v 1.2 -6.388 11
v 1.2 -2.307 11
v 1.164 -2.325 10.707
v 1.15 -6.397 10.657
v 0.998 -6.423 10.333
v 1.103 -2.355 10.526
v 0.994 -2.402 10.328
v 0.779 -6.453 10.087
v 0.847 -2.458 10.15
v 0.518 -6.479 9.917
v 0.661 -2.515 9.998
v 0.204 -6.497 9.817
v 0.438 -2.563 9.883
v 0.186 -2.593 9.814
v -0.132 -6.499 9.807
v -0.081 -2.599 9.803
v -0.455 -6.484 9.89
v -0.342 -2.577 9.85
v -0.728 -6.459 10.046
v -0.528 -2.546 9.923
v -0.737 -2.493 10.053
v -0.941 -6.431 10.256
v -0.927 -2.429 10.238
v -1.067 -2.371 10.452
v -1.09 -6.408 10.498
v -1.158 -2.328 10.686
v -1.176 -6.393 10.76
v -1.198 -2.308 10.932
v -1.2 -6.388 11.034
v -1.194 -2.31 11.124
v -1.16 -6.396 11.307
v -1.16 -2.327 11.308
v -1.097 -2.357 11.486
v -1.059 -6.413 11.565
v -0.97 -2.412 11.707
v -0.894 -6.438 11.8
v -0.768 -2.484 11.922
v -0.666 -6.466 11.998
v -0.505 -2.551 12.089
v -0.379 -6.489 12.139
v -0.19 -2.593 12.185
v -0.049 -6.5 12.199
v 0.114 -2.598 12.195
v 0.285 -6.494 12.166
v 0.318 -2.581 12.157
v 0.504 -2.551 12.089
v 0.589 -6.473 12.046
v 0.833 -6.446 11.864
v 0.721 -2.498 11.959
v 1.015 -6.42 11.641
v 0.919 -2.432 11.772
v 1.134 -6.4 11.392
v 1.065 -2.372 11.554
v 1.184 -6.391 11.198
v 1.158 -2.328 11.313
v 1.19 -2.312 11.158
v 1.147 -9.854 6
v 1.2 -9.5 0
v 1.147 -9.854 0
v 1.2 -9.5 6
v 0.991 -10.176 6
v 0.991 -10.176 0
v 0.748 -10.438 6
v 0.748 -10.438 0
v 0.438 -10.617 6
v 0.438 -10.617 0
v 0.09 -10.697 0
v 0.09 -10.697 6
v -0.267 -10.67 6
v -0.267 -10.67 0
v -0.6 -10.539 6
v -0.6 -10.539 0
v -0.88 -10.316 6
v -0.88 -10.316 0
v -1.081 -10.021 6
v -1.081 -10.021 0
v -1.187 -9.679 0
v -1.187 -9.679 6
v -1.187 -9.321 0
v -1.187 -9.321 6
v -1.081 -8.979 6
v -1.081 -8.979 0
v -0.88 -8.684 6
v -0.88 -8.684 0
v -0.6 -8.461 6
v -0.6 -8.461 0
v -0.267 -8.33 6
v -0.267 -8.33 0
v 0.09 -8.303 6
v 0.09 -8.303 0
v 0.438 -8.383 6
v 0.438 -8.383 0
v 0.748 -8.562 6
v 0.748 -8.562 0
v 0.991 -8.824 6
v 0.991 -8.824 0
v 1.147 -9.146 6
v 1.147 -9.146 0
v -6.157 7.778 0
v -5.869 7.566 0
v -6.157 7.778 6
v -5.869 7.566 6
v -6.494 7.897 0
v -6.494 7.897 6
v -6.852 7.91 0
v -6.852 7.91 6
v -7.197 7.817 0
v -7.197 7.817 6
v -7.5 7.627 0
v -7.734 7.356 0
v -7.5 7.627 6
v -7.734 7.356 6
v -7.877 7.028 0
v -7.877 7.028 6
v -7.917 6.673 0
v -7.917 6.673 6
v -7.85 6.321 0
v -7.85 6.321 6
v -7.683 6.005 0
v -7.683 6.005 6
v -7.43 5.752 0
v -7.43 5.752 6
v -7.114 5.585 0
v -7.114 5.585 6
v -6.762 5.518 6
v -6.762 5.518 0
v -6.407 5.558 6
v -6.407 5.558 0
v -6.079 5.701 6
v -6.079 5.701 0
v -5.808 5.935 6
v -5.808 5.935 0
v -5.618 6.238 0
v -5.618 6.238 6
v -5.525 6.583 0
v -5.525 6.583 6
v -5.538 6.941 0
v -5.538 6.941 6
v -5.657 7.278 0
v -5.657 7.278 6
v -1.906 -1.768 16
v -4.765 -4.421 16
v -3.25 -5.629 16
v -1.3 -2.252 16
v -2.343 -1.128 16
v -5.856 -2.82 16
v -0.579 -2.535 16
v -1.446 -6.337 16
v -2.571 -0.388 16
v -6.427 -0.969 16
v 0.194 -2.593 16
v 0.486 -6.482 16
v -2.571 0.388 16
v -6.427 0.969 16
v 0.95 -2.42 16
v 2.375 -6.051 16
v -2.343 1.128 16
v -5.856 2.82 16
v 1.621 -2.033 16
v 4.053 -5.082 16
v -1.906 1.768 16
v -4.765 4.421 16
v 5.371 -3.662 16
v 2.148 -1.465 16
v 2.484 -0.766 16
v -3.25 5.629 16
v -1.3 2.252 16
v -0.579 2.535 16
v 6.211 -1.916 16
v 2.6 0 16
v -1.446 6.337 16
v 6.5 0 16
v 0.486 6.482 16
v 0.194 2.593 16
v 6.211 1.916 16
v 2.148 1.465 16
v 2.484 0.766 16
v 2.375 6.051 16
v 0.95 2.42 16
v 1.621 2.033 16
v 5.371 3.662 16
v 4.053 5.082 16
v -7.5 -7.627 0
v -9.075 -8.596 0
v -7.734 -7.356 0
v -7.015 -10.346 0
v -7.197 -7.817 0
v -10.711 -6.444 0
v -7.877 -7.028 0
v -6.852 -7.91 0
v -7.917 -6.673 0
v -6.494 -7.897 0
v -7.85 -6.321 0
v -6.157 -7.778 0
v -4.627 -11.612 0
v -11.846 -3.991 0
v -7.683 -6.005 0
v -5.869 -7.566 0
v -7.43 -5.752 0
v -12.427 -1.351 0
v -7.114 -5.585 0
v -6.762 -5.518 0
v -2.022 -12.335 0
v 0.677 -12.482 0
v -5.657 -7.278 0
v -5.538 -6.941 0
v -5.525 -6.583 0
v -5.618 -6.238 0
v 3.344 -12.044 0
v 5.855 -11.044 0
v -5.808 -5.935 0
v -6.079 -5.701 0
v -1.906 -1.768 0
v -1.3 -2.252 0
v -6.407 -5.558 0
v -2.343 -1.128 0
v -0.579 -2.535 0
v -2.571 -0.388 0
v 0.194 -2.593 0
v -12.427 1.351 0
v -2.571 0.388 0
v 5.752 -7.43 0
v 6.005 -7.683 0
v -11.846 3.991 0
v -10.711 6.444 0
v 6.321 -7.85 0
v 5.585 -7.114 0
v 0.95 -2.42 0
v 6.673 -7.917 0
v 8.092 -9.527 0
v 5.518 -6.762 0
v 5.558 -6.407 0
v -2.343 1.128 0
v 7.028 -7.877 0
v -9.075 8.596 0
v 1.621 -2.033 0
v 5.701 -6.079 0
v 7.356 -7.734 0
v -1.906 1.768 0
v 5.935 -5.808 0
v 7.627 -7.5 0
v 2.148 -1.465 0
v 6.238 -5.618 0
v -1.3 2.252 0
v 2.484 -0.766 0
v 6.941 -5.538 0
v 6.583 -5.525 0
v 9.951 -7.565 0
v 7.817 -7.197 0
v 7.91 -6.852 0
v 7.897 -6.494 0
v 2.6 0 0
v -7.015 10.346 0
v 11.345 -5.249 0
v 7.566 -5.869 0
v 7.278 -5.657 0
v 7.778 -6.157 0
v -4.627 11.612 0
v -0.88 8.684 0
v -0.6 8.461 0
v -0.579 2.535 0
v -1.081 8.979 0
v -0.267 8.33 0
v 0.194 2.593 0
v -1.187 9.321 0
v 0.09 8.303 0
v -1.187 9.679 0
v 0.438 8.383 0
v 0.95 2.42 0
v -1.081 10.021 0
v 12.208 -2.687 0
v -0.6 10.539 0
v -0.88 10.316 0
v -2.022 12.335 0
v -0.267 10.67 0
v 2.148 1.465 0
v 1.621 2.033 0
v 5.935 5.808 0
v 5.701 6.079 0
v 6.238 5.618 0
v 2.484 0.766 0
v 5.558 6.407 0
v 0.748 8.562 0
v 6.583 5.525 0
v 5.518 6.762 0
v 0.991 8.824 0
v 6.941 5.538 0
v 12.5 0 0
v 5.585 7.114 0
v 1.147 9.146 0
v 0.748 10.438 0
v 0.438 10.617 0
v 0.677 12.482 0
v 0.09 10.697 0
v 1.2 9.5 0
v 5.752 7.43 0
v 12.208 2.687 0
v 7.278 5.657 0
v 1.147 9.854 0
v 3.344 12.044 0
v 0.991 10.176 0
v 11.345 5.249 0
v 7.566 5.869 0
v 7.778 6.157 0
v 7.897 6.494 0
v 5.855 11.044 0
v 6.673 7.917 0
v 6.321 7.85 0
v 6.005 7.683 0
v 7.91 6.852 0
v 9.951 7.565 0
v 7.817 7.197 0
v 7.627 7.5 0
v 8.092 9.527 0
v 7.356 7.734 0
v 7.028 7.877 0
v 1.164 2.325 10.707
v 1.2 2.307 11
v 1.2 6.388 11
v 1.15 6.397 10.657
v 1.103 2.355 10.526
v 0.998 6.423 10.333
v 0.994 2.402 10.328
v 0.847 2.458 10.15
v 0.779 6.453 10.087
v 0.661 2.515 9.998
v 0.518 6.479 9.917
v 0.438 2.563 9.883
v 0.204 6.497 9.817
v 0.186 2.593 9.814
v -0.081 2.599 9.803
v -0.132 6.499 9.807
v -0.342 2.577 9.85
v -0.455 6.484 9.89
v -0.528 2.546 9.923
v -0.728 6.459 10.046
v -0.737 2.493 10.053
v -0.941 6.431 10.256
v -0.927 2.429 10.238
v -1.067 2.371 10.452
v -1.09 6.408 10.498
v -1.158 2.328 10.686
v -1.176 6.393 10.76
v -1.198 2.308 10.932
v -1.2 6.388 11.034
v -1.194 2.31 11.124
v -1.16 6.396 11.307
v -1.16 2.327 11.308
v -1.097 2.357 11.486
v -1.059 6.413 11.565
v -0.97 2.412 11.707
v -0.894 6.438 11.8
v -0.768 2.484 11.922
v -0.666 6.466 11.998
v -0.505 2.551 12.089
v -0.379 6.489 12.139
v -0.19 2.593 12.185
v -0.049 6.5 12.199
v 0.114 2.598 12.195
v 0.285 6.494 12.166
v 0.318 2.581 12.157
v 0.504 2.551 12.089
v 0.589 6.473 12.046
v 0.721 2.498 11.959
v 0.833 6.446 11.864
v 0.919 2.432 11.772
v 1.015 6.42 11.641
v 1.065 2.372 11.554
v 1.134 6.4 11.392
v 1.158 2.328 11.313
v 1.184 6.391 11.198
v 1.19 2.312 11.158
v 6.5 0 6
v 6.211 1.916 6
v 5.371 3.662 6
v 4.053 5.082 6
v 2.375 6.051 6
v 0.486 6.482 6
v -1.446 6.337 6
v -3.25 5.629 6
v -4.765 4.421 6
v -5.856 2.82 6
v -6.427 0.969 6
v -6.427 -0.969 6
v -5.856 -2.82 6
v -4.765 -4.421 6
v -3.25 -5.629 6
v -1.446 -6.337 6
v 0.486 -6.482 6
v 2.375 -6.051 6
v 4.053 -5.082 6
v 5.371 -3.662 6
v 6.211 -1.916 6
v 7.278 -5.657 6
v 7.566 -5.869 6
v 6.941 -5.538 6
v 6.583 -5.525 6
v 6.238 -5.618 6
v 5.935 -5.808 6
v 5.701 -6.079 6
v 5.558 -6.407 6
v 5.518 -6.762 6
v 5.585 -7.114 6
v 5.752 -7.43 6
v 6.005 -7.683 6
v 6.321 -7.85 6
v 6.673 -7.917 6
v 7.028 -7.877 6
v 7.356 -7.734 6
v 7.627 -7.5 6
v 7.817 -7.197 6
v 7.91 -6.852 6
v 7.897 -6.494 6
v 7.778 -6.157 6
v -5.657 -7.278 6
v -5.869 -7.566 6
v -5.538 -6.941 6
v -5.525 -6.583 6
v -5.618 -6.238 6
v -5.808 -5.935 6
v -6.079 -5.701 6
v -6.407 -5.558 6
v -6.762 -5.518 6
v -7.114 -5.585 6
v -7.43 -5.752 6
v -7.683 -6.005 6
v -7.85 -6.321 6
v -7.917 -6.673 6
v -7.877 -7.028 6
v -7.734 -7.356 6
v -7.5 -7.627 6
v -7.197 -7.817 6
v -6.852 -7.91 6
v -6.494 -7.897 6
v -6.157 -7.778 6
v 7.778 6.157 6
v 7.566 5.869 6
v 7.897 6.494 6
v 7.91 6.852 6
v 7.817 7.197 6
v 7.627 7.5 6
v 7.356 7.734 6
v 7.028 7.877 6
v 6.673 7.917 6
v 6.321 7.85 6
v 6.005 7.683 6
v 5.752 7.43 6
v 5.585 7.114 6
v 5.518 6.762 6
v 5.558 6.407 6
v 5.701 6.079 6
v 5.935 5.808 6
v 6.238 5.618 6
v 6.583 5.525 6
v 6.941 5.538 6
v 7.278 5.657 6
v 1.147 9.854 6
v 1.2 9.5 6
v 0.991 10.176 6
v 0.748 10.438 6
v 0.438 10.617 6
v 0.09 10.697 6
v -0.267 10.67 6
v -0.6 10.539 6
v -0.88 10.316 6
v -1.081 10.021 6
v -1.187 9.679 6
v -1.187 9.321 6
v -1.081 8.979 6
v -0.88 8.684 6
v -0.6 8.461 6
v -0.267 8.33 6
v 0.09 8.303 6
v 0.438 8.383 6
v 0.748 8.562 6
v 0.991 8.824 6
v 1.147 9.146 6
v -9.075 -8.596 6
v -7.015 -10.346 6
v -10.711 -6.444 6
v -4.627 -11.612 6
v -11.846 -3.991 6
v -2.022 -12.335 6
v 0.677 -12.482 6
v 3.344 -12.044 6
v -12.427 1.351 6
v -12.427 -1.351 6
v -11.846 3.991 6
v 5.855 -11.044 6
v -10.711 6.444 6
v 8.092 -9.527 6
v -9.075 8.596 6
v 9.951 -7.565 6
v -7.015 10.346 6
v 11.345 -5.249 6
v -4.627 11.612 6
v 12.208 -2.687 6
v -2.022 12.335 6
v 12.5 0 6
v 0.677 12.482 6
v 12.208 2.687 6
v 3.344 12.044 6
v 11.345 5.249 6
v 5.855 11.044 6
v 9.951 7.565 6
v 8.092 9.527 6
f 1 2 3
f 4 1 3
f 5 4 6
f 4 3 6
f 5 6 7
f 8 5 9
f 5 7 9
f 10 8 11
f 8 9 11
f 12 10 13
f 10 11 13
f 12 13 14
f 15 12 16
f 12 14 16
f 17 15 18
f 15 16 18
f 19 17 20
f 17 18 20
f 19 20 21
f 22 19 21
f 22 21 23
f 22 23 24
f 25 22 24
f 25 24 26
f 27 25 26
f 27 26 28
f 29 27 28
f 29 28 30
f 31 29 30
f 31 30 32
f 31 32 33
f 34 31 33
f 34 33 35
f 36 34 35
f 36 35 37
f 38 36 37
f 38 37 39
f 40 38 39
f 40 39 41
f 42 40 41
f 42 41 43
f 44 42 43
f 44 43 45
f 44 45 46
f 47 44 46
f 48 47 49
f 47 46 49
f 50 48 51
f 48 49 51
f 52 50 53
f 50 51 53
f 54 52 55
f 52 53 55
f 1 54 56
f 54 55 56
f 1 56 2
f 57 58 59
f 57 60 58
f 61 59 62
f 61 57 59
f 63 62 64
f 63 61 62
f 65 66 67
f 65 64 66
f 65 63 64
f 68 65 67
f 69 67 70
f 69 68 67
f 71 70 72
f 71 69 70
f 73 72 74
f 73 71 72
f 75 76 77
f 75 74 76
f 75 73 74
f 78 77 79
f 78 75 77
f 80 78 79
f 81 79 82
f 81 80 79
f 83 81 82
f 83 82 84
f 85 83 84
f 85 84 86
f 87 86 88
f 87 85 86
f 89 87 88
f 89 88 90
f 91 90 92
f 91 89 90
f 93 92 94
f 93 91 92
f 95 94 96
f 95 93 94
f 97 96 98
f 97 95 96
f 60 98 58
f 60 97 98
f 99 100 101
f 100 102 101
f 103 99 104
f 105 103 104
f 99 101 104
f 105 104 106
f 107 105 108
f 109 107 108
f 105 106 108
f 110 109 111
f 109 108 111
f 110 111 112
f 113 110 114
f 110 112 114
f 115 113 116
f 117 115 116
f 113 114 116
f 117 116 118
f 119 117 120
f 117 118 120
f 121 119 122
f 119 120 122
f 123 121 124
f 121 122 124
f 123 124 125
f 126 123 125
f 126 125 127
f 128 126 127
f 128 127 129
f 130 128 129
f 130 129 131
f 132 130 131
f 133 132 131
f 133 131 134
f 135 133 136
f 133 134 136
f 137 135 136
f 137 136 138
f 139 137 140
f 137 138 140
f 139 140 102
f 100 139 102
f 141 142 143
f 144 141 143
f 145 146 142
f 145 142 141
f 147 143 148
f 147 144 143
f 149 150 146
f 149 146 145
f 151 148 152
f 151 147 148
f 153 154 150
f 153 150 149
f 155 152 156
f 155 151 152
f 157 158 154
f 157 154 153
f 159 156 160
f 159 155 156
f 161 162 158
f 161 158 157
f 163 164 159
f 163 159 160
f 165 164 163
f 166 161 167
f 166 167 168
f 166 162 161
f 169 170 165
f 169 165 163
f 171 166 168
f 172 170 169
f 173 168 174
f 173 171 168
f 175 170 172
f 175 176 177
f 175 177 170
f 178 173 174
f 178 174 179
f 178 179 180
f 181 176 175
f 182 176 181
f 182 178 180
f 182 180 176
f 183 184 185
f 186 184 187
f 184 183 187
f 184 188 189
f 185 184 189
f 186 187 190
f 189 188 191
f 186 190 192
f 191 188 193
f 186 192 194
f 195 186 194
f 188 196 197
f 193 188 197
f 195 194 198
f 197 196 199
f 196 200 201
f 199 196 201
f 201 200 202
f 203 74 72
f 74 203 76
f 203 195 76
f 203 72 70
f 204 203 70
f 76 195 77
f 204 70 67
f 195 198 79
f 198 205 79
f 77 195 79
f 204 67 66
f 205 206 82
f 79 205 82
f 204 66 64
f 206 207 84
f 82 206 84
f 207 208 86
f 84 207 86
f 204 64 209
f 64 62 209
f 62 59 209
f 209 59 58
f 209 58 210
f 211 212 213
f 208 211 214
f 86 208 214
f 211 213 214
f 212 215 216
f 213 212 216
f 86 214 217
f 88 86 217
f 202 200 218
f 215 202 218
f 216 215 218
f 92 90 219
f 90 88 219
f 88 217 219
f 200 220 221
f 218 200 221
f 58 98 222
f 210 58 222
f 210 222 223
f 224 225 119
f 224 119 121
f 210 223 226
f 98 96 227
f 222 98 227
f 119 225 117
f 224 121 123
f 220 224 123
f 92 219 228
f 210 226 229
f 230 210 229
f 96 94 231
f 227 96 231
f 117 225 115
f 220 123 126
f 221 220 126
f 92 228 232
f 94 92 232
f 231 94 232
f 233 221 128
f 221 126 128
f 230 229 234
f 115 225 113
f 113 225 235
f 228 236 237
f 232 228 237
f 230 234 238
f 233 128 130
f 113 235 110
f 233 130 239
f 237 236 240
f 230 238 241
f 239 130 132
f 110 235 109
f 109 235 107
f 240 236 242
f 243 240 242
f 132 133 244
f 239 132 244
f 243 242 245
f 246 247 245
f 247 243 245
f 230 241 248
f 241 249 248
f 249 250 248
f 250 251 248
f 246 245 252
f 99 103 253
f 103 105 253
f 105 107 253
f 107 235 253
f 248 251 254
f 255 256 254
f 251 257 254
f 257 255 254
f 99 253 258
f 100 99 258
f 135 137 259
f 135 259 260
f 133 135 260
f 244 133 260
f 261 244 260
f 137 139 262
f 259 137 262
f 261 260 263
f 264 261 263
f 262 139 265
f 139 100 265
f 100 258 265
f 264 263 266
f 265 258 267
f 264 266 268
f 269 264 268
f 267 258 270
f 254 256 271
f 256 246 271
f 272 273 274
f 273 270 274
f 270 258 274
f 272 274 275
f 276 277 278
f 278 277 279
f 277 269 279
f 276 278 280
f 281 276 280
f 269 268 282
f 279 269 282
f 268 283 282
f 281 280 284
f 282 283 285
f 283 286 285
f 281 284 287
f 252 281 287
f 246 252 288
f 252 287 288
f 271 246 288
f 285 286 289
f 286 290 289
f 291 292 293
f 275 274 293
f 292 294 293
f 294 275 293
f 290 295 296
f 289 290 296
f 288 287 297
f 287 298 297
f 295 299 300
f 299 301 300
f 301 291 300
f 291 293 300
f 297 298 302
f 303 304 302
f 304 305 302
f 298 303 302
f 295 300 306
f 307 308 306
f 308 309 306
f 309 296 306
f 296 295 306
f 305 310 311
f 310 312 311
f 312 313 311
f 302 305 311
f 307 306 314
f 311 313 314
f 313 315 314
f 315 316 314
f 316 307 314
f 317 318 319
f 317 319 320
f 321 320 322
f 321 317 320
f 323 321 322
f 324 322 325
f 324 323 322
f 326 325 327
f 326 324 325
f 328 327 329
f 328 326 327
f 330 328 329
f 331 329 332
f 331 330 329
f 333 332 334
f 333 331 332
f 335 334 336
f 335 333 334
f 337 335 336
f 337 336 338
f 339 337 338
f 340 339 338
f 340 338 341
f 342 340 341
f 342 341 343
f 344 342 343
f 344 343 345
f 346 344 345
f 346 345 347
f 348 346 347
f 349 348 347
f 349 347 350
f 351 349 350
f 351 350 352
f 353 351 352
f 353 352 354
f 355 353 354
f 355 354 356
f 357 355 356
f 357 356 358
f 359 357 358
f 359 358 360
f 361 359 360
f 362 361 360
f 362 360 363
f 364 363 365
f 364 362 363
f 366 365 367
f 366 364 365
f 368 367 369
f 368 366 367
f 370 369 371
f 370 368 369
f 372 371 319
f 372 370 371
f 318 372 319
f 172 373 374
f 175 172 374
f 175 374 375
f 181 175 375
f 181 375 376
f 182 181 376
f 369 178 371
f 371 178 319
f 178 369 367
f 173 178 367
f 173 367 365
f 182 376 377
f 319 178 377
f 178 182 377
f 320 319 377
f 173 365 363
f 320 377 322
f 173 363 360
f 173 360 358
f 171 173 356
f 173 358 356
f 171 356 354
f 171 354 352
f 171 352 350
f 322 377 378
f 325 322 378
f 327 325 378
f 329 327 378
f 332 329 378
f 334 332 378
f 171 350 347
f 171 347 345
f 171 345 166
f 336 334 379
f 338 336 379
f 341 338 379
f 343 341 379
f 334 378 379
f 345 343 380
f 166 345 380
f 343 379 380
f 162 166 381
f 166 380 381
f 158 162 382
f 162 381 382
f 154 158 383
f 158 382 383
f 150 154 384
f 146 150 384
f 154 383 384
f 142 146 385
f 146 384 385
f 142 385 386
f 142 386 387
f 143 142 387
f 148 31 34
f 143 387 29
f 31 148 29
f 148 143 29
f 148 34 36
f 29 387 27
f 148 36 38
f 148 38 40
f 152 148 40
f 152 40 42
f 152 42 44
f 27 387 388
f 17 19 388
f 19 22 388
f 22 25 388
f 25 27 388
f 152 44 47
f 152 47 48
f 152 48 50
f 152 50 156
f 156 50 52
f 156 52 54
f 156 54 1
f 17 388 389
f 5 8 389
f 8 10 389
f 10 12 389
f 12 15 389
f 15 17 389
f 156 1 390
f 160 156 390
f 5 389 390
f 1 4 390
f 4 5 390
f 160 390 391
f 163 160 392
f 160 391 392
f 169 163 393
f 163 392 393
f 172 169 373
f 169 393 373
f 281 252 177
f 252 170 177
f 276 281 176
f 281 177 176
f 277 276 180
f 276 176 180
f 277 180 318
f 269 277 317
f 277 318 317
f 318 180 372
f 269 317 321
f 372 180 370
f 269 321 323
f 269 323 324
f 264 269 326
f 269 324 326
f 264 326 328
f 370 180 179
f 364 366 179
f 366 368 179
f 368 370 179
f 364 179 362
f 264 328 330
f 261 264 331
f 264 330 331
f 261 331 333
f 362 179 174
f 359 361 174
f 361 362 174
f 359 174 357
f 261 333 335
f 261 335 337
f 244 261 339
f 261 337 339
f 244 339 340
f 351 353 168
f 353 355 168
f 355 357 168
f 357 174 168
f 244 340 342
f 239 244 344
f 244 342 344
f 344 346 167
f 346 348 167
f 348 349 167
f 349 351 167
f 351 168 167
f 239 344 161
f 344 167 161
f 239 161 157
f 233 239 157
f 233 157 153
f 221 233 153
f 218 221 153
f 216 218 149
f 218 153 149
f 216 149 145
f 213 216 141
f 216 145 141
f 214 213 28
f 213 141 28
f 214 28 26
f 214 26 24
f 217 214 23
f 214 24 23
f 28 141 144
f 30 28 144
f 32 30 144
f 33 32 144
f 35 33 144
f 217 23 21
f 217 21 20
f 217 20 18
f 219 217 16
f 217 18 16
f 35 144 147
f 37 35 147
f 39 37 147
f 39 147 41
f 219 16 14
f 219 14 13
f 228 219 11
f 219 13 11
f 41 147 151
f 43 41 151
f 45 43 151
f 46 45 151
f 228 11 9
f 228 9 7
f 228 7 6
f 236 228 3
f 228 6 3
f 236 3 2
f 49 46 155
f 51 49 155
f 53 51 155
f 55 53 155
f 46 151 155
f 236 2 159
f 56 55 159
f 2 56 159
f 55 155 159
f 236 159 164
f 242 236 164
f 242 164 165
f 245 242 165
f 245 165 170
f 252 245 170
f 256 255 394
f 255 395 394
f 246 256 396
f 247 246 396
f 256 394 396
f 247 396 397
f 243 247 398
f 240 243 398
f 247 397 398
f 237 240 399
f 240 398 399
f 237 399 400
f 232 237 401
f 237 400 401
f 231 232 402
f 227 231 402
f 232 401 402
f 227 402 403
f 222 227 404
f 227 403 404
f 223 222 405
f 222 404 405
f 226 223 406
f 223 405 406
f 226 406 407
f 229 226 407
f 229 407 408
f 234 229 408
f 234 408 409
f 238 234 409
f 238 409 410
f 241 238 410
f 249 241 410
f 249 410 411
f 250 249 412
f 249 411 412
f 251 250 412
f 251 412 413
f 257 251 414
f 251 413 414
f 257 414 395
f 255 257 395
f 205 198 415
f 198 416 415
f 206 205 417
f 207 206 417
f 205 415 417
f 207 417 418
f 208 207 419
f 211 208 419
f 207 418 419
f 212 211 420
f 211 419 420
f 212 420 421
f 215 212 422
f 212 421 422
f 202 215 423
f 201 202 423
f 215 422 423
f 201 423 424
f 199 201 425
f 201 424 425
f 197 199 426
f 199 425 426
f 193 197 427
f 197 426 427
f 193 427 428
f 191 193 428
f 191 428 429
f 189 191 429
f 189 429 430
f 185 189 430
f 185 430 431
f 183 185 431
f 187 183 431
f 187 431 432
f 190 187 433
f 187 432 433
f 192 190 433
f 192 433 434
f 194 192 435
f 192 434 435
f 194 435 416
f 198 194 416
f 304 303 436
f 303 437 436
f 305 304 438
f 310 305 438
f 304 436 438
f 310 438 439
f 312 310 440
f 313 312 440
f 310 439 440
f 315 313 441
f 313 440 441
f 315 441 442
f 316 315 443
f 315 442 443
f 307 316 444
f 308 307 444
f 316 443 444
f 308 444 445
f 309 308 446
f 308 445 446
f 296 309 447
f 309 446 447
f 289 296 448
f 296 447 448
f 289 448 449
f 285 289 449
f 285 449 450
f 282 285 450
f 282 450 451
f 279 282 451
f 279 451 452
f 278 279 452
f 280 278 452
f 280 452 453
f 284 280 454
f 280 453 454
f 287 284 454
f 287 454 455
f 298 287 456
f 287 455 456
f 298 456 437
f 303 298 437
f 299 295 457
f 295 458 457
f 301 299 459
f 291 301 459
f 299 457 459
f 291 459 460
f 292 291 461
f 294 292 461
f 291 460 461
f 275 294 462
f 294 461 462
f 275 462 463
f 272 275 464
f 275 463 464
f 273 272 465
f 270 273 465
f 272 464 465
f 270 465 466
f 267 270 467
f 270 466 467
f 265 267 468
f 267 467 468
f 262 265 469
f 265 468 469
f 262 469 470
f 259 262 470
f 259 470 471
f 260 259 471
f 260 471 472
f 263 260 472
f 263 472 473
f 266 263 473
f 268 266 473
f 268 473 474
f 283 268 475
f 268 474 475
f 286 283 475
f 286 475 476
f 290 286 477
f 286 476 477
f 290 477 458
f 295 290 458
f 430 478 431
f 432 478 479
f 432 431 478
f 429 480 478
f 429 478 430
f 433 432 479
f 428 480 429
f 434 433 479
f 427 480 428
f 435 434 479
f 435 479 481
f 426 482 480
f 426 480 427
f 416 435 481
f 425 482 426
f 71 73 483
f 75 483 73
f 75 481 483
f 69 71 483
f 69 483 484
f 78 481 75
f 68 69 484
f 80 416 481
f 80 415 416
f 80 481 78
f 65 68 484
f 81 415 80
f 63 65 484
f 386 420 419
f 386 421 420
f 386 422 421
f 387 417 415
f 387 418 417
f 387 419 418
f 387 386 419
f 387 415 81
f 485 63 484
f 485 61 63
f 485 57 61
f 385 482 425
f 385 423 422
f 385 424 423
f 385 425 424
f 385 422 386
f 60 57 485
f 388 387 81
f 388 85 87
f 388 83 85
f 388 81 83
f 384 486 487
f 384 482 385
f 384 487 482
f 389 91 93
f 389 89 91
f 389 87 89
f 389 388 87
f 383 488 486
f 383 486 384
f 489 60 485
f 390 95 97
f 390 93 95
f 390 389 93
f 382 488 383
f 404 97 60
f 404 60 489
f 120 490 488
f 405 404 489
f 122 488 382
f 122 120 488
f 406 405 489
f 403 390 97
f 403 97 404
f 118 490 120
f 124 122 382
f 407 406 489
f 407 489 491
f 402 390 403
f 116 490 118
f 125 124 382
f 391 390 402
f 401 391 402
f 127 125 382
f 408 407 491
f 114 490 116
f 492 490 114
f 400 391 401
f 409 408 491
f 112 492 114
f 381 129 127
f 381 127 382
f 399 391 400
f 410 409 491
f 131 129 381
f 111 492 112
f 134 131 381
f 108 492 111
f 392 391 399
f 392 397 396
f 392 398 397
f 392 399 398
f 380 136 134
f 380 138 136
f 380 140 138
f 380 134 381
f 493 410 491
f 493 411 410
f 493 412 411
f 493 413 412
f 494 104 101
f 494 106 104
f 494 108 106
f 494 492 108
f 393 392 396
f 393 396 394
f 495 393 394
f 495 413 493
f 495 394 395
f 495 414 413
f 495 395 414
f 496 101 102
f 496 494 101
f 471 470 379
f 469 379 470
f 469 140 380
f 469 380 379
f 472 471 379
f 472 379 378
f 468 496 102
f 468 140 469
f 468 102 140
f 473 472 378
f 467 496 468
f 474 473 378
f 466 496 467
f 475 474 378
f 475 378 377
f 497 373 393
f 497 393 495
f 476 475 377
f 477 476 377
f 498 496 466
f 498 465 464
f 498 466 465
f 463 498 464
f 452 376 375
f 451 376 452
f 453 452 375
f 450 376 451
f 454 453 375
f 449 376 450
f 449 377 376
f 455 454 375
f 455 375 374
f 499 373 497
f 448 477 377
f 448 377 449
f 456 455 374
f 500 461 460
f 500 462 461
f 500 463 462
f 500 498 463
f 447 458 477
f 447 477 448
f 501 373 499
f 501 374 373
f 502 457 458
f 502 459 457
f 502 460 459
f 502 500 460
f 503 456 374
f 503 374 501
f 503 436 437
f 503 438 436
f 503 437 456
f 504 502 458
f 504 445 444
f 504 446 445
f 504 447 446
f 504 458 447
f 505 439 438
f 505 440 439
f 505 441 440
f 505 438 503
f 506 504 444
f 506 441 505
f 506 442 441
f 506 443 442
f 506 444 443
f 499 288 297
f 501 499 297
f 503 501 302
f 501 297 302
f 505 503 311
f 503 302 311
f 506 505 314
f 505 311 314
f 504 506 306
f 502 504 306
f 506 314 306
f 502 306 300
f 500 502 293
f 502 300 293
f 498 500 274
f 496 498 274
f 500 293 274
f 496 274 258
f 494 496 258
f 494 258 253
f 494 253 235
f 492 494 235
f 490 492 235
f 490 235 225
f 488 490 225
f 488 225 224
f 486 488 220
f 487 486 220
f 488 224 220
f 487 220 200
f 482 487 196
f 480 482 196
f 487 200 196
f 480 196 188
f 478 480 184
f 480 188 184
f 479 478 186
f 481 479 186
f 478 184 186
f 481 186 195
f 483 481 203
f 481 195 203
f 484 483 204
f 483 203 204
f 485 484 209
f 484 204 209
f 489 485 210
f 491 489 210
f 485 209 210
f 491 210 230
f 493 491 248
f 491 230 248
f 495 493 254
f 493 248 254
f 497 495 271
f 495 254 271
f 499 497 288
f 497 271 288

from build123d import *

# Parameters (mm, degrees)
SKETCH2_R               = 12.5
BOSS_EXTRUDE1_DEPTH     = 6
SKETCH3_R               = 6.5
SKETCH3_R_2             = 2.5
BOSS_EXTRUDE2_DEPTH     = 10
CUT_EXTRUDE1_DEPTH      = 25
CUT_EXTRUDE1_DEPTH_BACK = 25
SKETCH4_R               = 1.2
SKETCH5_R               = 1.2
CUT_EXTRUDE2_DEPTH      = 25
CIRPATTERN1_COUNT       = 2
CIRPATTERN1_ANGLE       = 45
CUT_EXTRUDE3_DEPTH      = 50
CUT_EXTRUDE3_DEPTH_BACK = 20
SKETCH6_R               = 2.6
CIRPATTERN2_COUNT       = 2
CIRPATTERN2_ANGLE       = 315
MIRROR1_COPY_1_SKETCH_R = 1.2
MIRROR1_COPY_1_DEPTH    = 25
MIRROR1_COPY_2_SKETCH_R = 1.2
MIRROR1_COPY_2_DEPTH    = 25
MIRROR1_COPY_3_SKETCH_R = 1.2
MIRROR1_COPY_3_DEPTH    = 25
MIRROR1_COPY_4_SKETCH_R = 1.2
MIRROR1_COPY_4_DEPTH    = 25


with BuildPart() as part:
    # Sketch2 → Boss-Extrude1 (new body)
    with BuildSketch(Plane.XY):
        Circle(SKETCH2_R)
    extrude(amount=BOSS_EXTRUDE1_DEPTH)

    # Sketch3 → Boss-Extrude2 (add)
    with BuildSketch(Plane.XY.offset(6)):
        Circle(SKETCH3_R)
        Circle(SKETCH3_R_2, mode=Mode.SUBTRACT)
    extrude(amount=BOSS_EXTRUDE2_DEPTH)

    # Sketch4 → Cut-Extrude1 (cut, two sides: drawn at the far end of the back side and taken through both)
    with BuildSketch(Plane(origin=(0, 0, 0), x_dir=(1, 0, 0), z_dir=(0, 1, 0)).offset(-CUT_EXTRUDE1_DEPTH_BACK)):
        with Locations((0, -11)):
            Circle(SKETCH4_R)
    extrude(amount=CUT_EXTRUDE1_DEPTH + CUT_EXTRUDE1_DEPTH_BACK, mode=Mode.SUBTRACT)

    # Sketch5 → Cut-Extrude2 (cut, symmetric)
    with BuildSketch(Plane.XY.offset(6)):
        with Locations((0, 9.5)):
            Circle(SKETCH5_R)
    cut_extrude2 = extrude(amount=CUT_EXTRUDE2_DEPTH, both=True, mode=Mode.SUBTRACT)

    # CirPattern1: Cut-Extrude2 ×2 about axis
    cirpattern1_axis = Axis((0, 0, -0.6), (0, 0, 1))
    for i in range(1, CIRPATTERN1_COUNT):
        add(cut_extrude2.rotate(cirpattern1_axis, i * CIRPATTERN1_ANGLE / (CIRPATTERN1_COUNT - 1)), mode=Mode.SUBTRACT)

    # Sketch6 → Cut-Extrude3 (cut, two sides: drawn at the far end of the back side and taken through both)
    with BuildSketch(Plane.XY.offset(6).offset(-CUT_EXTRUDE3_DEPTH_BACK)):
        Circle(SKETCH6_R)
    extrude(amount=CUT_EXTRUDE3_DEPTH + CUT_EXTRUDE3_DEPTH_BACK, mode=Mode.SUBTRACT)

    # CirPattern2: Cut-Extrude2 ×2 about axis
    cirpattern2_axis = Axis((0, 0, 6), (0, 0, 1))
    for i in range(1, CIRPATTERN2_COUNT):
        add(cut_extrude2.rotate(cirpattern2_axis, i * CIRPATTERN2_ANGLE / (CIRPATTERN2_COUNT - 1)), mode=Mode.SUBTRACT)

    # Mirror1 copy 1 sketch → Mirror1 copy 1 (cut, symmetric)
    with BuildSketch(Plane(origin=(0, 0, 6), x_dir=(0.707106781186546, -0.707106781186549, 0), z_dir=(0, 0, 1))):
        with Locations((0, -9.5)):
            Circle(MIRROR1_COPY_1_SKETCH_R)
    extrude(amount=MIRROR1_COPY_1_DEPTH, both=True, mode=Mode.SUBTRACT)

    # Mirror1 copy 2 sketch → Mirror1 copy 2 (cut, symmetric)
    with BuildSketch(Plane.XY.offset(6)):
        with Locations((0, -9.5)):
            Circle(MIRROR1_COPY_2_SKETCH_R)
    extrude(amount=MIRROR1_COPY_2_DEPTH, both=True, mode=Mode.SUBTRACT)

    # Mirror1 copy 3 sketch → Mirror1 copy 3 (cut, symmetric)
    with BuildSketch(Plane(origin=(0, 0, 6), x_dir=(0.7071067811865561, 0.7071067811865389, 0), z_dir=(0, 0, 1))):
        with Locations((0, -9.5)):
            Circle(MIRROR1_COPY_3_SKETCH_R)
    extrude(amount=MIRROR1_COPY_3_DEPTH, both=True, mode=Mode.SUBTRACT)

    # Mirror1 copy 4 sketch → Mirror1 copy 4 (cut, symmetric)
    with BuildSketch(Plane.XY.offset(6)):
        with Locations((0, -9.5)):
            Circle(MIRROR1_COPY_4_SKETCH_R)
    extrude(amount=MIRROR1_COPY_4_DEPTH, both=True, mode=Mode.SUBTRACT)


solid = part.part
